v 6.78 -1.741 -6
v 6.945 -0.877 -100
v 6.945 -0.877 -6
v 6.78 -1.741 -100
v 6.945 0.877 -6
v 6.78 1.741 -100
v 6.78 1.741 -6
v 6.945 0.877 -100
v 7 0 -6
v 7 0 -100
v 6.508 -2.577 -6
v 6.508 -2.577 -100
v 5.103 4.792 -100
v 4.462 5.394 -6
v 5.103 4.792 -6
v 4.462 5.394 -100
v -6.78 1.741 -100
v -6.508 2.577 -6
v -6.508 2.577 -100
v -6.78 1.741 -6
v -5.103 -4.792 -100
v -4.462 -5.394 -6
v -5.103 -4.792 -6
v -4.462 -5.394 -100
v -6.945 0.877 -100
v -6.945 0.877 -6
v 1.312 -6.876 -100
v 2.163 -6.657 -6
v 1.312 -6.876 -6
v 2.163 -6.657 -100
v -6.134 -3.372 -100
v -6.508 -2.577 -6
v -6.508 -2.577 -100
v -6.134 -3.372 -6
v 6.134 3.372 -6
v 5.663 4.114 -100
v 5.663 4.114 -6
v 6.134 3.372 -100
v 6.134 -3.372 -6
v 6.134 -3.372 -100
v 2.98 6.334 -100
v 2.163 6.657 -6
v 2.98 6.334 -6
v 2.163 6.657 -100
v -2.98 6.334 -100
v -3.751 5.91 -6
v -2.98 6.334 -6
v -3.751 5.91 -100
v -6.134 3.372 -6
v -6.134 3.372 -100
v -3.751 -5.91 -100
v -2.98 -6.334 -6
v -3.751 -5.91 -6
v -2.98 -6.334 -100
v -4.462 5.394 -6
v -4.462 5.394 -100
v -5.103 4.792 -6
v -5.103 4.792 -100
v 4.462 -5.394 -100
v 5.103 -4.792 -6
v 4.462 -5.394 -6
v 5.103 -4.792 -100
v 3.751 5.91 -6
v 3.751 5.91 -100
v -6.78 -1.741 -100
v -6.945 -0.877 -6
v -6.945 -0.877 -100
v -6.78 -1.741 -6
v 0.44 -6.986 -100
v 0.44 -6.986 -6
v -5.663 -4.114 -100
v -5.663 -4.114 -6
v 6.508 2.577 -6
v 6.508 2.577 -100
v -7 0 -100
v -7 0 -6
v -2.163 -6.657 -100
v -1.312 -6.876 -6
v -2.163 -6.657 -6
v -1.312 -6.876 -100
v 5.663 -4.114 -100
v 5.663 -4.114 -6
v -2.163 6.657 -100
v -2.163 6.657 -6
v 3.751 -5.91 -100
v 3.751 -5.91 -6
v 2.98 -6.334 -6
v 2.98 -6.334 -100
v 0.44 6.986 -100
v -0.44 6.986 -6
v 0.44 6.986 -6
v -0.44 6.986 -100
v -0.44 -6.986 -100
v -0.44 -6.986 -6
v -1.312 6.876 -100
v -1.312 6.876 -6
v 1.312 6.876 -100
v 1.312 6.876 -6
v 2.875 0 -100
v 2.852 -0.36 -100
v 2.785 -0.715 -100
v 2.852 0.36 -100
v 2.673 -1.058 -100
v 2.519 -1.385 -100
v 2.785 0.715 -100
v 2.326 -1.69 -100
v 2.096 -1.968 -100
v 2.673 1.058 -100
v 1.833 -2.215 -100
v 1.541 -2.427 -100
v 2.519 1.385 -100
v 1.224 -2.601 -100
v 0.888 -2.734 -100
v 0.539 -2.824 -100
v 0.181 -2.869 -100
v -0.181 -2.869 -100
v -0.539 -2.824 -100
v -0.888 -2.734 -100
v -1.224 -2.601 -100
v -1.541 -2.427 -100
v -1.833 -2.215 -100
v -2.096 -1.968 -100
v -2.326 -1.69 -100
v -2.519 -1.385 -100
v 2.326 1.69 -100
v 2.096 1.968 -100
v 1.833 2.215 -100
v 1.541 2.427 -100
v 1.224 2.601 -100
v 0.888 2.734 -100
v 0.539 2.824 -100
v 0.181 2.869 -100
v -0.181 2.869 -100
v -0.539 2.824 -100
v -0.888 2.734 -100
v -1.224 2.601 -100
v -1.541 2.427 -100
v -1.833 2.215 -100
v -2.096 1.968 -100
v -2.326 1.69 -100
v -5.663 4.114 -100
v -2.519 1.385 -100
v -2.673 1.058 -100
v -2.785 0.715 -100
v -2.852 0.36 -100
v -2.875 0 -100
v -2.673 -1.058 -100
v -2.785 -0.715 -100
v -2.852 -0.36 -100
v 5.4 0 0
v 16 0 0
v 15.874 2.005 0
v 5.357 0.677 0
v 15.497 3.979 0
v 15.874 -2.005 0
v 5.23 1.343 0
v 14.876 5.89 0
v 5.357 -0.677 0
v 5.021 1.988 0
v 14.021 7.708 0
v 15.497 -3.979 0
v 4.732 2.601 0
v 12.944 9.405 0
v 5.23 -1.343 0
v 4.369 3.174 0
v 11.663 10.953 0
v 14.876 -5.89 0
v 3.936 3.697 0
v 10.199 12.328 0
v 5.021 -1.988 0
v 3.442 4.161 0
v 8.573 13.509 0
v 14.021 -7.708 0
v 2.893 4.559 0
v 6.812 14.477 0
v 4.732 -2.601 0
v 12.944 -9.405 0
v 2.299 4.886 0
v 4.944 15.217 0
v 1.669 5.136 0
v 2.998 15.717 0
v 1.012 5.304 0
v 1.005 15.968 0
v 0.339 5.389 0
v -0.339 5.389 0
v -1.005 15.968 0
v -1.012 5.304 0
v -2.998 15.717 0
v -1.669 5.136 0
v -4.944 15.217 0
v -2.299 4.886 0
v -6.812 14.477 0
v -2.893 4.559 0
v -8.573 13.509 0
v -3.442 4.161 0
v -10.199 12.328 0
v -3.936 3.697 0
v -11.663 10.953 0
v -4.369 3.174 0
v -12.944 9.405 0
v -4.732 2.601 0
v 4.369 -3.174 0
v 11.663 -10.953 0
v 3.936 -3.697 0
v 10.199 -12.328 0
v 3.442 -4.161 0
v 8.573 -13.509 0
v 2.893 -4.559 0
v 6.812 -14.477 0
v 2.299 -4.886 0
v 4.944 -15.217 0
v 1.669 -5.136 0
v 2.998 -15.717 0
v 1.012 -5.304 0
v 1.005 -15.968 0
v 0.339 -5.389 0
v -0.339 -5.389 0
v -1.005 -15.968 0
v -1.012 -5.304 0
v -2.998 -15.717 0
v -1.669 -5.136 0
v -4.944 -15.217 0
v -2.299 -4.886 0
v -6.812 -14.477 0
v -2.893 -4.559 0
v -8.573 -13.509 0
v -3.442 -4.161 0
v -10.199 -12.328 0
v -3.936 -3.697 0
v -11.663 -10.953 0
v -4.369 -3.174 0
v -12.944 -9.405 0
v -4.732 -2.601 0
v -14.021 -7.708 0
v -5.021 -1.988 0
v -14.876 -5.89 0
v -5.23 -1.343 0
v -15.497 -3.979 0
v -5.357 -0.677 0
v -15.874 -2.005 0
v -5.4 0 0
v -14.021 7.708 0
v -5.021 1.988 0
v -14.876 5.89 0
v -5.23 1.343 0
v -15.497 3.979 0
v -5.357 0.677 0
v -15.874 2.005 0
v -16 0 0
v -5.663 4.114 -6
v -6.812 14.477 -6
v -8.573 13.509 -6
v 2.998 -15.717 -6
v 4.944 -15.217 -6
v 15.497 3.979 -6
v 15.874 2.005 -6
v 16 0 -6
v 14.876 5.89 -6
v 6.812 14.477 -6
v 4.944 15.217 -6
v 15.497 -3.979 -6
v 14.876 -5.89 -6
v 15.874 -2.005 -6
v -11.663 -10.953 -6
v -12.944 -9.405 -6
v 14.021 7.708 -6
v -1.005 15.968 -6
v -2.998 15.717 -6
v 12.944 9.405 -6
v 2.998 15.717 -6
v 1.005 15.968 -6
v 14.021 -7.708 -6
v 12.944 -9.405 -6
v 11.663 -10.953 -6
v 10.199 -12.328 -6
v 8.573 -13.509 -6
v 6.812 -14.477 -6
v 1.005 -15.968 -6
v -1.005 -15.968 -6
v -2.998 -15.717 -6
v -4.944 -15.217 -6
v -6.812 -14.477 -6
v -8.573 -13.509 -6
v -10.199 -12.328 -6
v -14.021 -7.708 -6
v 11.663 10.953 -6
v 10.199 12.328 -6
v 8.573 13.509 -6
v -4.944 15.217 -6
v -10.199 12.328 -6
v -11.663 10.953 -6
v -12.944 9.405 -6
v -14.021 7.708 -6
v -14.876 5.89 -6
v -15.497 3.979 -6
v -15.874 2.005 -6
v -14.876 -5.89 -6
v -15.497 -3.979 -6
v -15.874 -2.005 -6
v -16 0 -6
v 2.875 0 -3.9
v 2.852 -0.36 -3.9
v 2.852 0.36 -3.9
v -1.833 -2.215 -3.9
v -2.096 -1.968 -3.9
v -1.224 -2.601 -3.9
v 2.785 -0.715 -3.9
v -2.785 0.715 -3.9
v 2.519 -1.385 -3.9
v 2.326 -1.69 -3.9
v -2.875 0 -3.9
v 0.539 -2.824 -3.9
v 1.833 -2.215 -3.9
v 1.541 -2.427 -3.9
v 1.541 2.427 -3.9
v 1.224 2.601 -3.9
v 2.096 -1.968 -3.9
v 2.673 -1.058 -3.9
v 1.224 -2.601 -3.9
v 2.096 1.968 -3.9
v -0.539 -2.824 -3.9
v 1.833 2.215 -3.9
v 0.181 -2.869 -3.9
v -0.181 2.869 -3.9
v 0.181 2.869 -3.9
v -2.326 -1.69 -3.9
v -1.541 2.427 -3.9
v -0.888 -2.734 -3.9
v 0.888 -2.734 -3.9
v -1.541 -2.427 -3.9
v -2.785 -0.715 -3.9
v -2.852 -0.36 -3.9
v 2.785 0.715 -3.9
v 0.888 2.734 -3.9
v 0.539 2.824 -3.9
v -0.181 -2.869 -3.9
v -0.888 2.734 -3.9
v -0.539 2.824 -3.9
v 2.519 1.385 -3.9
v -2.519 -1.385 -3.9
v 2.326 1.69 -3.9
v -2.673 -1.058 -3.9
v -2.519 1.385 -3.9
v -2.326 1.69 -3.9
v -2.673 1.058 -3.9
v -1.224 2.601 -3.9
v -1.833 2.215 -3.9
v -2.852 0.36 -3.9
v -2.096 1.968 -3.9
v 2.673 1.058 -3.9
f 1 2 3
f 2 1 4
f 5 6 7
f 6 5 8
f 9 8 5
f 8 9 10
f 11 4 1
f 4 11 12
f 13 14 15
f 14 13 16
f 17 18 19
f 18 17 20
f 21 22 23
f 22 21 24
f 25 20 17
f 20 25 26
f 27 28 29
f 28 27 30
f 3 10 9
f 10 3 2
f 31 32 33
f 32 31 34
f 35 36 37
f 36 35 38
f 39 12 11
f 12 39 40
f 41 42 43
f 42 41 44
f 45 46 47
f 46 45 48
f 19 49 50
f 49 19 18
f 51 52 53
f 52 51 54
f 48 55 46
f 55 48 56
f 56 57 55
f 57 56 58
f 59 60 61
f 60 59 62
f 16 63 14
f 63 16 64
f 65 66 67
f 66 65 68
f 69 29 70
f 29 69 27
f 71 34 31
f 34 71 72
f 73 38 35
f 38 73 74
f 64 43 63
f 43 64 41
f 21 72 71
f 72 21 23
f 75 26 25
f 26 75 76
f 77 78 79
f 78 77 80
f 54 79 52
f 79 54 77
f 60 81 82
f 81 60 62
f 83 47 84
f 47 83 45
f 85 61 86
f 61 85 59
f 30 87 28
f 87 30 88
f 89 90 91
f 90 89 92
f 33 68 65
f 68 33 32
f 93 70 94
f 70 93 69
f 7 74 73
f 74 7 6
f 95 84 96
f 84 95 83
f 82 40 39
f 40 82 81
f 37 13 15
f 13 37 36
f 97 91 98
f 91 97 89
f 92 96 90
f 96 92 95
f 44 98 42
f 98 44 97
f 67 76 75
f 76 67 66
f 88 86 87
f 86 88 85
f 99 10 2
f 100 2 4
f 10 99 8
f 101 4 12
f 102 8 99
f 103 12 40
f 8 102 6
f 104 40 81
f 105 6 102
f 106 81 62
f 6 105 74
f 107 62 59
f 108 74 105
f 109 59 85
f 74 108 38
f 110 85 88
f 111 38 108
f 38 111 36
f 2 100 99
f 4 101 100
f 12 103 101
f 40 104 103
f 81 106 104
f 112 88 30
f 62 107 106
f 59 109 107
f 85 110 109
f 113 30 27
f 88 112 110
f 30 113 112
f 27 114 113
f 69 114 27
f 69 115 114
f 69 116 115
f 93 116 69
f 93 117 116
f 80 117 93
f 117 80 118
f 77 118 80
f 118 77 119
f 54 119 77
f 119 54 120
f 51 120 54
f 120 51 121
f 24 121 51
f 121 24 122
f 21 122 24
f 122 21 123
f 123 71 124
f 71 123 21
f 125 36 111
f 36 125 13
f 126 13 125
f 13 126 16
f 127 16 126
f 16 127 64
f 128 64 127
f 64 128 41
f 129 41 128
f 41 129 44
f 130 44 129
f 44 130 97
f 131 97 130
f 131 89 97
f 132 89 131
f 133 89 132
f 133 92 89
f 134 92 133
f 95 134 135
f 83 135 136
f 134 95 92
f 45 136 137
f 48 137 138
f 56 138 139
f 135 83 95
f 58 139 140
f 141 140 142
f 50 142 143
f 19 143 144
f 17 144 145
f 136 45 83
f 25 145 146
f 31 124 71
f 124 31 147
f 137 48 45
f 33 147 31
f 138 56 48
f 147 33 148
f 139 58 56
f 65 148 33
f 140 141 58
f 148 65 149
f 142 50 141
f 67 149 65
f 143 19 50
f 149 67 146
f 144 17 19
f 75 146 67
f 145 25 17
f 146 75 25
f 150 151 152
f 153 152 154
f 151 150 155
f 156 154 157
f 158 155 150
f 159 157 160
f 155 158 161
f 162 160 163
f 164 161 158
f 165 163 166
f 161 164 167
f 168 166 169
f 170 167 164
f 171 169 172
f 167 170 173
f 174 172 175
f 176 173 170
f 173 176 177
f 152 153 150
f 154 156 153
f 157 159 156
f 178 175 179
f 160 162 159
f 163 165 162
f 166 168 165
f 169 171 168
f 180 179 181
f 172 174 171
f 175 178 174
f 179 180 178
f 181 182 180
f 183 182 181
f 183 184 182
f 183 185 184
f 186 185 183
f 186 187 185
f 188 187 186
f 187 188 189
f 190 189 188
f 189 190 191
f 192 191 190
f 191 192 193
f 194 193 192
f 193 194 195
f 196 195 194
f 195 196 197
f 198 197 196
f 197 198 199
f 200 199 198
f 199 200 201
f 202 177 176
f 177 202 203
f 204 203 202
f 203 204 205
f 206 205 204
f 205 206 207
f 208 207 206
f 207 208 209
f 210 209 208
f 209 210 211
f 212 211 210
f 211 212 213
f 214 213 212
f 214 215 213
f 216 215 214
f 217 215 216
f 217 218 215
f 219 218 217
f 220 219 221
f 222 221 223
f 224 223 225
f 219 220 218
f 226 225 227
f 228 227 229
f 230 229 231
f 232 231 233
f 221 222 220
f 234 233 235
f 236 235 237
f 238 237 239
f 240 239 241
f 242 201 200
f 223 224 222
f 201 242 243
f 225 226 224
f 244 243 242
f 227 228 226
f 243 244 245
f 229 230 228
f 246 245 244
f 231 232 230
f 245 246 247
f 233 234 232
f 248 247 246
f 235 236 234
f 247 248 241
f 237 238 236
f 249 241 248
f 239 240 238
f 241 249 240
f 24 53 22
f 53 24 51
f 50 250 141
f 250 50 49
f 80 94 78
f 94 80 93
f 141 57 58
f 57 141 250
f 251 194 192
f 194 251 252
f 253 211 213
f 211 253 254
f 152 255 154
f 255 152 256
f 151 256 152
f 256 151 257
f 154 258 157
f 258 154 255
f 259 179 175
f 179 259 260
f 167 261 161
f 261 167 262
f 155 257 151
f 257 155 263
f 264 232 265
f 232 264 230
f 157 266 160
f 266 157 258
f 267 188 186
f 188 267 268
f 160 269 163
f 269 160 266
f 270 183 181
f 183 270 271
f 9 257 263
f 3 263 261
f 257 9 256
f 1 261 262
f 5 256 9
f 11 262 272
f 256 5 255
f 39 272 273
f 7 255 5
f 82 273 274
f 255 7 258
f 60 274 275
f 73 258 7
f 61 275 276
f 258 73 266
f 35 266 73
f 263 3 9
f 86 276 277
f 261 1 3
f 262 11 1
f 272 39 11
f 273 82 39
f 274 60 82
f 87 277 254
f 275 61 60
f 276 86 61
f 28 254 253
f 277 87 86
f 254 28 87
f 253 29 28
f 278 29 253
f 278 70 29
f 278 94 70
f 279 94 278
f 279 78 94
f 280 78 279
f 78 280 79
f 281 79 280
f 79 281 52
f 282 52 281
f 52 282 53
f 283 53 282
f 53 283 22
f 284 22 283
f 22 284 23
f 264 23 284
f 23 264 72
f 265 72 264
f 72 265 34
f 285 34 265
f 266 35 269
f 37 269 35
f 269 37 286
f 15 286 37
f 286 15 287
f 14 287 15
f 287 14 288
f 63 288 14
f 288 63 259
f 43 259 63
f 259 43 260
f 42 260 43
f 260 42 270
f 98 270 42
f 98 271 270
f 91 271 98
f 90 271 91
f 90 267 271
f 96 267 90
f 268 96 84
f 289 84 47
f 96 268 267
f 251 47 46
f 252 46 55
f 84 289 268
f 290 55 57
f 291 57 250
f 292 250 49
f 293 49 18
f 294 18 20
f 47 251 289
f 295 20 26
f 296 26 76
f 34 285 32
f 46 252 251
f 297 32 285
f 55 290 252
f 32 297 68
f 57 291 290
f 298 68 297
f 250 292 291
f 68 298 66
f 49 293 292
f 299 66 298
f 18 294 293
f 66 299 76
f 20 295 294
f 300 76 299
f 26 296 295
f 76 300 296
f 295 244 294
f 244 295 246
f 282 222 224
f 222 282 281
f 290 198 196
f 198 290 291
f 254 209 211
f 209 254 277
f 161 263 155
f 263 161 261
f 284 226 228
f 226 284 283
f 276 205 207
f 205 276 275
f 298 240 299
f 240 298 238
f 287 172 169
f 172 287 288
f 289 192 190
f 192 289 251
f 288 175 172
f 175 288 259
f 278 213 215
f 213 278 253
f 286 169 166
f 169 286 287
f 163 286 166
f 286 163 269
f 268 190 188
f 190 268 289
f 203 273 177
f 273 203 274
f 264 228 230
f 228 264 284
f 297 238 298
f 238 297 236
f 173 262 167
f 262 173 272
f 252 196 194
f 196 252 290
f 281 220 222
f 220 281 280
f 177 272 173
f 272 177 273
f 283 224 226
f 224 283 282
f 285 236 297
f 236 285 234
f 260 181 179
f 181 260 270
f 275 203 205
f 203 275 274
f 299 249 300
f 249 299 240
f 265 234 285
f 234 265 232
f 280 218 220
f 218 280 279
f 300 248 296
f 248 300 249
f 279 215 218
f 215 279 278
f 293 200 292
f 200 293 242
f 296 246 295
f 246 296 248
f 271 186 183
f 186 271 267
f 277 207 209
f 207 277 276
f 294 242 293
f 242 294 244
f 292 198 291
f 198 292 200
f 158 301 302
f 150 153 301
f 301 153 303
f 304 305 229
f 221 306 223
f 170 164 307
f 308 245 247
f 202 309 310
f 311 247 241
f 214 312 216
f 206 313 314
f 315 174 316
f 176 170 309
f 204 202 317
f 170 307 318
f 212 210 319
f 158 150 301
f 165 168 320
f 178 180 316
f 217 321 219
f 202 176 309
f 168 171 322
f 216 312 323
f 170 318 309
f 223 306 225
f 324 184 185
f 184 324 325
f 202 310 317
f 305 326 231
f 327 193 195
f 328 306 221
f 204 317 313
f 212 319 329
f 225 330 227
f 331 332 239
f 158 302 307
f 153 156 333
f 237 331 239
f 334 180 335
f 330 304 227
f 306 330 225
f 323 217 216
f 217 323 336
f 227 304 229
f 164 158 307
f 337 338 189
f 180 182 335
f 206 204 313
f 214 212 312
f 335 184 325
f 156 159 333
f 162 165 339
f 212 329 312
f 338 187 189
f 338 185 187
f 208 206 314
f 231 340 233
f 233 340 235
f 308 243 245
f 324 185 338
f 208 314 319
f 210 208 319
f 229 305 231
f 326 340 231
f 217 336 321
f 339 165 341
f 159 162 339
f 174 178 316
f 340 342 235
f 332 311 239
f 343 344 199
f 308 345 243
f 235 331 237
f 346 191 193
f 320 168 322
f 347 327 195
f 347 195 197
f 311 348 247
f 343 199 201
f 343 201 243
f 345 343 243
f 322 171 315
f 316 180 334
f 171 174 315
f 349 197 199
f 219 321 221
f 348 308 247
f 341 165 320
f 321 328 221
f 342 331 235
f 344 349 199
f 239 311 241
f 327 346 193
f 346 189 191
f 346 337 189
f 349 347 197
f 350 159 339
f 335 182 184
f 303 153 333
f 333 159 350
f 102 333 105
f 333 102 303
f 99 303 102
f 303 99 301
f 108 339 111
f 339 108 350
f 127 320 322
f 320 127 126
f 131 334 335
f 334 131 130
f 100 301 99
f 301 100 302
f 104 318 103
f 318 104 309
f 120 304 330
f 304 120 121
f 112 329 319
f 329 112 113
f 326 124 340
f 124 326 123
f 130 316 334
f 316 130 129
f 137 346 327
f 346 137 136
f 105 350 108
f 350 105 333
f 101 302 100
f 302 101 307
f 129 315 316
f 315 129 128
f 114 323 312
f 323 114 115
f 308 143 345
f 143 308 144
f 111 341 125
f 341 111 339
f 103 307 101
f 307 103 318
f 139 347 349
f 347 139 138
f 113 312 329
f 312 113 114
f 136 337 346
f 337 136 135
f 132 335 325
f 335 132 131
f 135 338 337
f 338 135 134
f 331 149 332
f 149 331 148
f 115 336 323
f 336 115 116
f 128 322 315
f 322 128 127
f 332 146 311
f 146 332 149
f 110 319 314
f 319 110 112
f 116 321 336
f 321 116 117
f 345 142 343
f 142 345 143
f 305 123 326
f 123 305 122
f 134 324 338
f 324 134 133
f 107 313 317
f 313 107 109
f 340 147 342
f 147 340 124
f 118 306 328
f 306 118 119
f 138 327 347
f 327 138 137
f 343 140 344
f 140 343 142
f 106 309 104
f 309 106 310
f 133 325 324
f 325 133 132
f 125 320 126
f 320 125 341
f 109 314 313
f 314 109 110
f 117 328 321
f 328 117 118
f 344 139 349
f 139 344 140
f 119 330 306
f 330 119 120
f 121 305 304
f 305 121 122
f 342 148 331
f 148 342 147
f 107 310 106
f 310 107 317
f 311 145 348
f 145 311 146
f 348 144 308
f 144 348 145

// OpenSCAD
$fn = 50;


difference() {
	union() {
		translate(v = [0, 0, -100.0000000000]) {
			cylinder(h = 100, r = 7.0000000000);
		}
		translate(v = [0, 0, -6.0000000000]) {
			cylinder(h = 6, r = 16.0000000000);
		}
	}
	union() {
		translate(v = [0, 0, 0]) {
			rotate(a = [0, 0, 0]) {
				difference() {
					union() {
						#translate(v = [0, 0, -100.0000000000]) {
							cylinder(h = 100, r = 2.6000000000);
						}
						#translate(v = [0, 0, -3.9000000000]) {
							cylinder(h = 3.9000000000, r1 = 2.8750000000, r2 = 5.4000000000);
						}
						#translate(v = [0, 0, -100.0000000000]) {
							cylinder(h = 100, r = 2.8750000000);
						}
						#translate(v = [0, 0, -100.0000000000]) {
							cylinder(h = 100, r = 2.6000000000);
						}
					}
					union();
				}
			}
		}
	}
}
